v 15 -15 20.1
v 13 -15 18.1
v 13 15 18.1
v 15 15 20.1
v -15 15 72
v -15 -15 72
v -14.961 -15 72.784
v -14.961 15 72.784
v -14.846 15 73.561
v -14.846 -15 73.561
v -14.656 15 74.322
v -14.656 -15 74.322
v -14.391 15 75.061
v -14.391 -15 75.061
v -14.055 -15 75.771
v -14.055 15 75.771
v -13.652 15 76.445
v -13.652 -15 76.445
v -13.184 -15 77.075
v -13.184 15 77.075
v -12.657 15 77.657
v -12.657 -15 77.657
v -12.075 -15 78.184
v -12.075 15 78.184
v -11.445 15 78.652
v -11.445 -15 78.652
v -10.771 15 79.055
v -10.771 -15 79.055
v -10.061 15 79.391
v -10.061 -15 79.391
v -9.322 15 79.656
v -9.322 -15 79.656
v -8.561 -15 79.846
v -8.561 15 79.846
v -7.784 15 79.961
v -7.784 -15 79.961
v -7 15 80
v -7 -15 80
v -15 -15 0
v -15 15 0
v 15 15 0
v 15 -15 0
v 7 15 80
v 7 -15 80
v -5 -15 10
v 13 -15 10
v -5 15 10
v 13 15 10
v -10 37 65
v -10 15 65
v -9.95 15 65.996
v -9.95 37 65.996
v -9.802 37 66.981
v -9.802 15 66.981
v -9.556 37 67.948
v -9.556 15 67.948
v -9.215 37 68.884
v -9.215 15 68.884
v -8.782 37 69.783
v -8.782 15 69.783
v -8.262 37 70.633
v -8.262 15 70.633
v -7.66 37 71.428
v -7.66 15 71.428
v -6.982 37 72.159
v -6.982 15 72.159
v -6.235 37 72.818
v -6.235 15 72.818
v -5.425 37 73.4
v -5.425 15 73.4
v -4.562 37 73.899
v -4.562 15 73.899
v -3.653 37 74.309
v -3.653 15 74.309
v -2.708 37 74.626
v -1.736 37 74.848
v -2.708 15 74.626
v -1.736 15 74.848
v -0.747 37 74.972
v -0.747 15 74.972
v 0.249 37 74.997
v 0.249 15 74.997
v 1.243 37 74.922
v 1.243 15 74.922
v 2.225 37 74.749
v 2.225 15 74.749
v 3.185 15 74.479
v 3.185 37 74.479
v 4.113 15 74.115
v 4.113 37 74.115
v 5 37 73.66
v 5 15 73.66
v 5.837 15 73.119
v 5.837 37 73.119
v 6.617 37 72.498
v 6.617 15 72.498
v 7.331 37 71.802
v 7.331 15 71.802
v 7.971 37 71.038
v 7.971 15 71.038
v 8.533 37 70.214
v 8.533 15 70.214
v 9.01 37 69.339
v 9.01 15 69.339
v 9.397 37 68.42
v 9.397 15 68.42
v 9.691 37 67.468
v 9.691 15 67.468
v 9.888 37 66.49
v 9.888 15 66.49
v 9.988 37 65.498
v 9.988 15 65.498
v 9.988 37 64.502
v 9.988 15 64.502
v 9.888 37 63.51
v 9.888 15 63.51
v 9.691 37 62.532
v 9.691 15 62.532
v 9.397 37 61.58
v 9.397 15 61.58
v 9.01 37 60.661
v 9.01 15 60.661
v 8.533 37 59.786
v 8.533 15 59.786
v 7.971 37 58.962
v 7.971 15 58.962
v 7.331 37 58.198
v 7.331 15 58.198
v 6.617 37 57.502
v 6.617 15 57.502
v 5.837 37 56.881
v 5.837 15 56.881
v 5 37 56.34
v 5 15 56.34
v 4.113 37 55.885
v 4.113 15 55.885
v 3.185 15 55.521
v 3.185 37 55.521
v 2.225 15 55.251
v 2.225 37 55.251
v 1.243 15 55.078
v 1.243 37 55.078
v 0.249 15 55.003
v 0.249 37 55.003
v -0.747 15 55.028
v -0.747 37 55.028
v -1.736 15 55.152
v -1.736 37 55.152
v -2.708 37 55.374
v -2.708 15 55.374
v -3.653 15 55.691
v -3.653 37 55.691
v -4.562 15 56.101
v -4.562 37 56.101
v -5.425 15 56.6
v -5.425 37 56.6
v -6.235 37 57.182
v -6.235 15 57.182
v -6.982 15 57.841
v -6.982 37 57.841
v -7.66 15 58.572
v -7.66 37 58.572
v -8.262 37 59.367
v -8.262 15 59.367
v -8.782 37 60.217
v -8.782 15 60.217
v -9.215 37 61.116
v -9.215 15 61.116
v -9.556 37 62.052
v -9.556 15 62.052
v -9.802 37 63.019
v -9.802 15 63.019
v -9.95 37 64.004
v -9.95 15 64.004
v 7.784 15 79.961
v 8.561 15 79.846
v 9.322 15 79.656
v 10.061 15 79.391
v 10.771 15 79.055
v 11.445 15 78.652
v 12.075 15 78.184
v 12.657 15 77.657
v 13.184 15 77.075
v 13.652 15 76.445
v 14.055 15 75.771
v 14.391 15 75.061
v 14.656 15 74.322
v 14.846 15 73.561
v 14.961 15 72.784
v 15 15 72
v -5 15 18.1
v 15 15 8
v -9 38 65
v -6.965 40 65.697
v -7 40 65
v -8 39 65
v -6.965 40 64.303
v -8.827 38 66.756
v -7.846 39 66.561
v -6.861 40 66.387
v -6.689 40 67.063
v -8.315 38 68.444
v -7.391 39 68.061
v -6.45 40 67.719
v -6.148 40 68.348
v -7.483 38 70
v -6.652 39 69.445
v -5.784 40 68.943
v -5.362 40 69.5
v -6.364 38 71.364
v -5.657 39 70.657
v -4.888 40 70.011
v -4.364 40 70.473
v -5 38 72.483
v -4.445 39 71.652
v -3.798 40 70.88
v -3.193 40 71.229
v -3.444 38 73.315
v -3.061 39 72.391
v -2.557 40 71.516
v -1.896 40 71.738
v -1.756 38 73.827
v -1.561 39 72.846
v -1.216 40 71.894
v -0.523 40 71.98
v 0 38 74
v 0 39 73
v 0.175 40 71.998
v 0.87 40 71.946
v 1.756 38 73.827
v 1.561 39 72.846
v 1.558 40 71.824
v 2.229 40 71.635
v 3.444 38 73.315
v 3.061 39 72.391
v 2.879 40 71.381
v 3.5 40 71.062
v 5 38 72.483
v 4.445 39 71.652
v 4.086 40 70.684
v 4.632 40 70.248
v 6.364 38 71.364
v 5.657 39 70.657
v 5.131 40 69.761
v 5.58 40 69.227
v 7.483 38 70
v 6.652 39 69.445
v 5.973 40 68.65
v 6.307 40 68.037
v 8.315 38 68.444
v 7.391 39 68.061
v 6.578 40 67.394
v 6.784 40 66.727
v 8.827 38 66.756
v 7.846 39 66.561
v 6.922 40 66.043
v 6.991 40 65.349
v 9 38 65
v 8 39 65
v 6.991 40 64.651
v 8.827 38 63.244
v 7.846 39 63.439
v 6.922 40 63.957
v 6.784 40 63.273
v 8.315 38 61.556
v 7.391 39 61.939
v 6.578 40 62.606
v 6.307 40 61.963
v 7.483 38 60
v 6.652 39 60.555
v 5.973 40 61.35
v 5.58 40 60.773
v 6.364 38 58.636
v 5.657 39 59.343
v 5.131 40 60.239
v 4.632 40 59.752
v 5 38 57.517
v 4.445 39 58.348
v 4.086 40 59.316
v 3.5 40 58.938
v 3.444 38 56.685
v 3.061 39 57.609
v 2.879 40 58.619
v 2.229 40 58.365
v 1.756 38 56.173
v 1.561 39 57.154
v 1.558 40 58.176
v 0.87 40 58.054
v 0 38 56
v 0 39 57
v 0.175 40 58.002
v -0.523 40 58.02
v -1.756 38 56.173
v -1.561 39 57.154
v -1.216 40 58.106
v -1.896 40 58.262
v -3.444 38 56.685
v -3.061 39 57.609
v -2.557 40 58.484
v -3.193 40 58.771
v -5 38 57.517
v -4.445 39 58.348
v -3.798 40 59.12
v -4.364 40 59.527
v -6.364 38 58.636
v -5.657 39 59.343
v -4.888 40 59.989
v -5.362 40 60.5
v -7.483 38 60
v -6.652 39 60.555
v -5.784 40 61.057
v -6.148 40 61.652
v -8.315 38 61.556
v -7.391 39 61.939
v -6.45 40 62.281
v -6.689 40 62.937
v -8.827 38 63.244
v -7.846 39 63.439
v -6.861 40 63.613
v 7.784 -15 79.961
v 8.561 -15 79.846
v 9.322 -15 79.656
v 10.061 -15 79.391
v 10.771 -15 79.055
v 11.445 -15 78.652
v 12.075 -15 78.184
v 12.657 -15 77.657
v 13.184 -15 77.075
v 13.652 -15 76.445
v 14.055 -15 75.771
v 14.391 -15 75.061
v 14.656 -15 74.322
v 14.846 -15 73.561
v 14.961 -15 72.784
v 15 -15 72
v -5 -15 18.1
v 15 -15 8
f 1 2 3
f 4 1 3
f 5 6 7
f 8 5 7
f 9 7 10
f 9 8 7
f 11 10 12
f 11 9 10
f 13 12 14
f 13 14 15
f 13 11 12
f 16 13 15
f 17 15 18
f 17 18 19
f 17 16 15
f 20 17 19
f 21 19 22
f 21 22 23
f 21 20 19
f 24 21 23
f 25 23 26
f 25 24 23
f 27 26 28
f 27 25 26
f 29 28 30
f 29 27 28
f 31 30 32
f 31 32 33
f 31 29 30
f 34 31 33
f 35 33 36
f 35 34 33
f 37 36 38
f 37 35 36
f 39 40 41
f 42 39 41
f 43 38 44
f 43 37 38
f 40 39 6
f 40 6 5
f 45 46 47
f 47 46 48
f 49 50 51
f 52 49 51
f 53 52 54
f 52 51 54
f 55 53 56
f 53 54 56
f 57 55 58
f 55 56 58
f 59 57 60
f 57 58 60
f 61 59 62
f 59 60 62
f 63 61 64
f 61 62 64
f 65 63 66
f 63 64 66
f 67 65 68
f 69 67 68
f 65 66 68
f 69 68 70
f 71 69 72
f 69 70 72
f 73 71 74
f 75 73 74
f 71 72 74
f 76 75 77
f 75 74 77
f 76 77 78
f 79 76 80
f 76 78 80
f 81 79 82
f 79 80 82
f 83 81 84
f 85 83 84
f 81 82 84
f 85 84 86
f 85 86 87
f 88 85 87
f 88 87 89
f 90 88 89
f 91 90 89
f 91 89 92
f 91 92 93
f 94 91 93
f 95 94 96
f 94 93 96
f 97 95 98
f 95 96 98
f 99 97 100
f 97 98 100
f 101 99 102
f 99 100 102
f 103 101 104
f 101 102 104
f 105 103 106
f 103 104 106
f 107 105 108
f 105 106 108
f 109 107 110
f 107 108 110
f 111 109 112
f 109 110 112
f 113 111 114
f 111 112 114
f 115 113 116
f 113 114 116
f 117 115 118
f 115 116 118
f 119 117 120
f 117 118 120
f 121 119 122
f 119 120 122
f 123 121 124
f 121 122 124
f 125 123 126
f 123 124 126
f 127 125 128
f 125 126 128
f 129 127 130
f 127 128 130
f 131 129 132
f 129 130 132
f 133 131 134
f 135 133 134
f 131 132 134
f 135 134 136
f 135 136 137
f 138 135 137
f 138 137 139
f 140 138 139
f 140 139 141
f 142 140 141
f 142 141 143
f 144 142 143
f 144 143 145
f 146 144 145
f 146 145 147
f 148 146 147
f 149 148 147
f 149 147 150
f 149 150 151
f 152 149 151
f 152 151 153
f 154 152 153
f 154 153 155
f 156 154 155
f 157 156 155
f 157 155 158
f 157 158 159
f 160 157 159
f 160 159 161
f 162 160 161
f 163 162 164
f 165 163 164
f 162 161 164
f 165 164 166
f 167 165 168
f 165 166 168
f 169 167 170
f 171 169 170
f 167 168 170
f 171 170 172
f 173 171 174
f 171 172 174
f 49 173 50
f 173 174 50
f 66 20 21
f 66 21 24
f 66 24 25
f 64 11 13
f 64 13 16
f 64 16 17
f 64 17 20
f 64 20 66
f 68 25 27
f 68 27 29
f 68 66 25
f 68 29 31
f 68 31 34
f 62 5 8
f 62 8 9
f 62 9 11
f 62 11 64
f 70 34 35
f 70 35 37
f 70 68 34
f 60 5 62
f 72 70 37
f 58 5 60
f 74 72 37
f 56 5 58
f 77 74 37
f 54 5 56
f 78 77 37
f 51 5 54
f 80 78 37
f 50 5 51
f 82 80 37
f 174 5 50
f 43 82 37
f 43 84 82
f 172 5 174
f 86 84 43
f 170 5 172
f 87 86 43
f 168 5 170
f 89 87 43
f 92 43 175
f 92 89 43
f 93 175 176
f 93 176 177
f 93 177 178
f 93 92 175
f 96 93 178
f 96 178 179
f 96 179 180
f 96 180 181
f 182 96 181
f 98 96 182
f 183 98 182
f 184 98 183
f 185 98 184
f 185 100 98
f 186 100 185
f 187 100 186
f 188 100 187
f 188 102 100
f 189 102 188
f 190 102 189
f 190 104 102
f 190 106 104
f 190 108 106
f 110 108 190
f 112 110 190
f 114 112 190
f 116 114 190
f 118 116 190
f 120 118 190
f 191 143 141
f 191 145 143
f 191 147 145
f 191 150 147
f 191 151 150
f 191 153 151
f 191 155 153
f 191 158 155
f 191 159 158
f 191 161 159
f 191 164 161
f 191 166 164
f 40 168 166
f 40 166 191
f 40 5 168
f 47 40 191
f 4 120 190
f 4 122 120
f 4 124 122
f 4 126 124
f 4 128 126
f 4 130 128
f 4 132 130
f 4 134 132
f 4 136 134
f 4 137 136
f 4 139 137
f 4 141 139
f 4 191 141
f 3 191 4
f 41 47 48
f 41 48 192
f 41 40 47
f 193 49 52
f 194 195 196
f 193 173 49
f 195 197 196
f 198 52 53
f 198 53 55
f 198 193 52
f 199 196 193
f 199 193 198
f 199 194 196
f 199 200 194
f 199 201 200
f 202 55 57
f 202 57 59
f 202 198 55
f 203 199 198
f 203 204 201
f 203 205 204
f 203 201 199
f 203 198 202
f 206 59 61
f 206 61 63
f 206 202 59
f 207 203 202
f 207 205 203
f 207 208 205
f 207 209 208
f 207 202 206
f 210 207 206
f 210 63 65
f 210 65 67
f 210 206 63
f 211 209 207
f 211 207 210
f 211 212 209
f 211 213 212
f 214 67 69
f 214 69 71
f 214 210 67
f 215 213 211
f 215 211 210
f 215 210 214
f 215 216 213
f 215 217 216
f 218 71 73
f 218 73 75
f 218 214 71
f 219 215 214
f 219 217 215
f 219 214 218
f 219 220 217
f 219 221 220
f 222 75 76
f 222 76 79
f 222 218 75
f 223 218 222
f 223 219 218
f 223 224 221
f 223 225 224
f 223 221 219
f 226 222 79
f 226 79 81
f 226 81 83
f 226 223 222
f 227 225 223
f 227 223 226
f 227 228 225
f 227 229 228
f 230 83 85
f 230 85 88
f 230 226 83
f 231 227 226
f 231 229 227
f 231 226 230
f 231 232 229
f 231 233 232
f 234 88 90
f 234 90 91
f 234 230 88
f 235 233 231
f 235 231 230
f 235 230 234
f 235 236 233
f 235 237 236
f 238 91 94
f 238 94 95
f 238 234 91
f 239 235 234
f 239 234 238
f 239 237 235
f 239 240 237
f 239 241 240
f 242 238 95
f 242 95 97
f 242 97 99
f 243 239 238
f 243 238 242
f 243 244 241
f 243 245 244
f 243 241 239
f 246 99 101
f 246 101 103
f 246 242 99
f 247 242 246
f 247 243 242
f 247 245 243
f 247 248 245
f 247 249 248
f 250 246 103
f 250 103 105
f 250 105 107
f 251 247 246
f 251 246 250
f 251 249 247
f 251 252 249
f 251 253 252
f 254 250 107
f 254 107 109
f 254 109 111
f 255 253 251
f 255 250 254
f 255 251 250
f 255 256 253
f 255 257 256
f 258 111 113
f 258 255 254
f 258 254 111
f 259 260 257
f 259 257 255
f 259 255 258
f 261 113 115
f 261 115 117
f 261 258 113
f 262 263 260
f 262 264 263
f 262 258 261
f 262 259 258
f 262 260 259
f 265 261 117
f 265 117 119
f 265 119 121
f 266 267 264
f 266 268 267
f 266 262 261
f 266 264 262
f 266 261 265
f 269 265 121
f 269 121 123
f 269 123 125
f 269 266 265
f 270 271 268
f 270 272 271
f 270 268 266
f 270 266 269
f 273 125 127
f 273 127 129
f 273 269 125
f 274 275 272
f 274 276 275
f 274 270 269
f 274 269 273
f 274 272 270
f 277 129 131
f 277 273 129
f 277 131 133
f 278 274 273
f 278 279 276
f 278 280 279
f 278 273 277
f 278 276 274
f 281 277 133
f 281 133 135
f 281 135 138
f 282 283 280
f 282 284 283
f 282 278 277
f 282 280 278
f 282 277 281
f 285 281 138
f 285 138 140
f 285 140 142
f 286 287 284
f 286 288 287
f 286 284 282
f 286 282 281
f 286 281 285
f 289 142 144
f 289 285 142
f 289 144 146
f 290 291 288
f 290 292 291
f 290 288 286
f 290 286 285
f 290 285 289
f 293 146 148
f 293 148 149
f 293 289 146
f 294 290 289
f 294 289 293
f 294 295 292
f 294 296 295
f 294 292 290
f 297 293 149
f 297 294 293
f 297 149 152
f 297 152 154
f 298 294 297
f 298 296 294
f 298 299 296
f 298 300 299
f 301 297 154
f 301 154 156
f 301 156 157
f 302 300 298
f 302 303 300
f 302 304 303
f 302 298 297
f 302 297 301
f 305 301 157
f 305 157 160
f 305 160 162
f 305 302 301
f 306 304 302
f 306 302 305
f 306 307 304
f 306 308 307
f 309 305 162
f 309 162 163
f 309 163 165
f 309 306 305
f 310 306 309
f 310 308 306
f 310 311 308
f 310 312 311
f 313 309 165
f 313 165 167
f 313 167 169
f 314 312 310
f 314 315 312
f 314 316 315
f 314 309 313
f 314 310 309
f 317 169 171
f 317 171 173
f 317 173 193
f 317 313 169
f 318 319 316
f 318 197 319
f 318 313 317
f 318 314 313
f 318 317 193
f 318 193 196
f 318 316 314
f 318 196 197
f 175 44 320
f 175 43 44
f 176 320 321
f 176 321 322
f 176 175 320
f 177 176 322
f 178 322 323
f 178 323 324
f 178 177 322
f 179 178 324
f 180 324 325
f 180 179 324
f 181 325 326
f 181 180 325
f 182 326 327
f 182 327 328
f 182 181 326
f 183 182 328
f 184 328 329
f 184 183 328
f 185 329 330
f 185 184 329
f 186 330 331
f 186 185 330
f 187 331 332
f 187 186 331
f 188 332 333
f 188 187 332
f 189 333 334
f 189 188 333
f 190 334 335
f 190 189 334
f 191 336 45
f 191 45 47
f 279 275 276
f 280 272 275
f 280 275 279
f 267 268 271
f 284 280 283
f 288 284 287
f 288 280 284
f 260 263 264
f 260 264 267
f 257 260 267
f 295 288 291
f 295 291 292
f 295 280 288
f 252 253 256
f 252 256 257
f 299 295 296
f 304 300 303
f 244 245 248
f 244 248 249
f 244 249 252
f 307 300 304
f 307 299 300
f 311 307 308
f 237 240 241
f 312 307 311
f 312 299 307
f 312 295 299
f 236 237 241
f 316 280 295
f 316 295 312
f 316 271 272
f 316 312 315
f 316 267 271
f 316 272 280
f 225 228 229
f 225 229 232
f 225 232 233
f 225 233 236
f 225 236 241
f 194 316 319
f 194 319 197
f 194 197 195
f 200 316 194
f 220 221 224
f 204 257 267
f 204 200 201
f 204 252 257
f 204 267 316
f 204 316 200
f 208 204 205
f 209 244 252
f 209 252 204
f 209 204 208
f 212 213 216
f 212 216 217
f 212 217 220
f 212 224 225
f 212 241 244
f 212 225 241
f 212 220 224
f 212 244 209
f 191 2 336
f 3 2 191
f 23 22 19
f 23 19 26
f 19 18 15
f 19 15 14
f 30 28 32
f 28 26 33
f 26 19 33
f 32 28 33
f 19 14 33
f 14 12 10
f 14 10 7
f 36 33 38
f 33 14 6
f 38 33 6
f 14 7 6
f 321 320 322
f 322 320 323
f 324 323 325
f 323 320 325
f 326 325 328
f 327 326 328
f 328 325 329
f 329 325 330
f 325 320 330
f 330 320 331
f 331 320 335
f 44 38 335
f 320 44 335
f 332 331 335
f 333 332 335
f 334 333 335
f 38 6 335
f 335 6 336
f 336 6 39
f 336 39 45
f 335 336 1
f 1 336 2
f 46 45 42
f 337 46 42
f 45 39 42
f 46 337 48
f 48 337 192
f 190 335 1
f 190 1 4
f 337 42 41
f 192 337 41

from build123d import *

# Parameters (mm, degrees)
F0_W     = 30
F0_H     = 30
F1_DEPTH = 80
F2_W     = 30
F2_H     = 8.1
F3_DEPTH = 20
F4_R     = 8
F5_SIZE  = 2
F6_R     = 10
F7_DEPTH = 25
F8_SIZE  = 3


with BuildPart() as f1:
    # F0 (on Top) → F1 (new body)
    with BuildSketch(Plane.XY):
        Rectangle(F0_W, F0_H)
    extrude(amount=F1_DEPTH)

    # F2 (on face) → F3 (cut)
    with BuildSketch(Plane.YZ.offset(15)):
        with Locations((0, 14.05)):
            Rectangle(F2_W, F2_H)
    extrude(amount=-F3_DEPTH, mode=Mode.SUBTRACT)

    # F4
    f4_edges = [f1.edges().sort_by_distance(p)[0] for p in [
        (15, 0, 80),
        (-15, 0, 80),
    ]]
    fillet(f4_edges, radius=F4_R)

    # F5
    f5_edges = [f1.edges().sort_by_distance(p)[0] for p in [
        (15, 0, 18.1),
        (15, 0, 10),
    ]]
    chamfer(f5_edges, length=F5_SIZE)

    # F6 (on face) → F7 (join)
    with BuildSketch(Plane(origin=(0, 15, 0), x_dir=(-1, 0, 0), z_dir=(0, 1, 0))):
        with Locations((0, 65)):
            Circle(F6_R)
    extrude(amount=F7_DEPTH)

    # F8
    f8_edges = [f1.edges().sort_by_distance(p)[0] for p in [
        (10, 40, 65),
    ]]
    chamfer(f8_edges, length=F8_SIZE)


solid = f1.part
